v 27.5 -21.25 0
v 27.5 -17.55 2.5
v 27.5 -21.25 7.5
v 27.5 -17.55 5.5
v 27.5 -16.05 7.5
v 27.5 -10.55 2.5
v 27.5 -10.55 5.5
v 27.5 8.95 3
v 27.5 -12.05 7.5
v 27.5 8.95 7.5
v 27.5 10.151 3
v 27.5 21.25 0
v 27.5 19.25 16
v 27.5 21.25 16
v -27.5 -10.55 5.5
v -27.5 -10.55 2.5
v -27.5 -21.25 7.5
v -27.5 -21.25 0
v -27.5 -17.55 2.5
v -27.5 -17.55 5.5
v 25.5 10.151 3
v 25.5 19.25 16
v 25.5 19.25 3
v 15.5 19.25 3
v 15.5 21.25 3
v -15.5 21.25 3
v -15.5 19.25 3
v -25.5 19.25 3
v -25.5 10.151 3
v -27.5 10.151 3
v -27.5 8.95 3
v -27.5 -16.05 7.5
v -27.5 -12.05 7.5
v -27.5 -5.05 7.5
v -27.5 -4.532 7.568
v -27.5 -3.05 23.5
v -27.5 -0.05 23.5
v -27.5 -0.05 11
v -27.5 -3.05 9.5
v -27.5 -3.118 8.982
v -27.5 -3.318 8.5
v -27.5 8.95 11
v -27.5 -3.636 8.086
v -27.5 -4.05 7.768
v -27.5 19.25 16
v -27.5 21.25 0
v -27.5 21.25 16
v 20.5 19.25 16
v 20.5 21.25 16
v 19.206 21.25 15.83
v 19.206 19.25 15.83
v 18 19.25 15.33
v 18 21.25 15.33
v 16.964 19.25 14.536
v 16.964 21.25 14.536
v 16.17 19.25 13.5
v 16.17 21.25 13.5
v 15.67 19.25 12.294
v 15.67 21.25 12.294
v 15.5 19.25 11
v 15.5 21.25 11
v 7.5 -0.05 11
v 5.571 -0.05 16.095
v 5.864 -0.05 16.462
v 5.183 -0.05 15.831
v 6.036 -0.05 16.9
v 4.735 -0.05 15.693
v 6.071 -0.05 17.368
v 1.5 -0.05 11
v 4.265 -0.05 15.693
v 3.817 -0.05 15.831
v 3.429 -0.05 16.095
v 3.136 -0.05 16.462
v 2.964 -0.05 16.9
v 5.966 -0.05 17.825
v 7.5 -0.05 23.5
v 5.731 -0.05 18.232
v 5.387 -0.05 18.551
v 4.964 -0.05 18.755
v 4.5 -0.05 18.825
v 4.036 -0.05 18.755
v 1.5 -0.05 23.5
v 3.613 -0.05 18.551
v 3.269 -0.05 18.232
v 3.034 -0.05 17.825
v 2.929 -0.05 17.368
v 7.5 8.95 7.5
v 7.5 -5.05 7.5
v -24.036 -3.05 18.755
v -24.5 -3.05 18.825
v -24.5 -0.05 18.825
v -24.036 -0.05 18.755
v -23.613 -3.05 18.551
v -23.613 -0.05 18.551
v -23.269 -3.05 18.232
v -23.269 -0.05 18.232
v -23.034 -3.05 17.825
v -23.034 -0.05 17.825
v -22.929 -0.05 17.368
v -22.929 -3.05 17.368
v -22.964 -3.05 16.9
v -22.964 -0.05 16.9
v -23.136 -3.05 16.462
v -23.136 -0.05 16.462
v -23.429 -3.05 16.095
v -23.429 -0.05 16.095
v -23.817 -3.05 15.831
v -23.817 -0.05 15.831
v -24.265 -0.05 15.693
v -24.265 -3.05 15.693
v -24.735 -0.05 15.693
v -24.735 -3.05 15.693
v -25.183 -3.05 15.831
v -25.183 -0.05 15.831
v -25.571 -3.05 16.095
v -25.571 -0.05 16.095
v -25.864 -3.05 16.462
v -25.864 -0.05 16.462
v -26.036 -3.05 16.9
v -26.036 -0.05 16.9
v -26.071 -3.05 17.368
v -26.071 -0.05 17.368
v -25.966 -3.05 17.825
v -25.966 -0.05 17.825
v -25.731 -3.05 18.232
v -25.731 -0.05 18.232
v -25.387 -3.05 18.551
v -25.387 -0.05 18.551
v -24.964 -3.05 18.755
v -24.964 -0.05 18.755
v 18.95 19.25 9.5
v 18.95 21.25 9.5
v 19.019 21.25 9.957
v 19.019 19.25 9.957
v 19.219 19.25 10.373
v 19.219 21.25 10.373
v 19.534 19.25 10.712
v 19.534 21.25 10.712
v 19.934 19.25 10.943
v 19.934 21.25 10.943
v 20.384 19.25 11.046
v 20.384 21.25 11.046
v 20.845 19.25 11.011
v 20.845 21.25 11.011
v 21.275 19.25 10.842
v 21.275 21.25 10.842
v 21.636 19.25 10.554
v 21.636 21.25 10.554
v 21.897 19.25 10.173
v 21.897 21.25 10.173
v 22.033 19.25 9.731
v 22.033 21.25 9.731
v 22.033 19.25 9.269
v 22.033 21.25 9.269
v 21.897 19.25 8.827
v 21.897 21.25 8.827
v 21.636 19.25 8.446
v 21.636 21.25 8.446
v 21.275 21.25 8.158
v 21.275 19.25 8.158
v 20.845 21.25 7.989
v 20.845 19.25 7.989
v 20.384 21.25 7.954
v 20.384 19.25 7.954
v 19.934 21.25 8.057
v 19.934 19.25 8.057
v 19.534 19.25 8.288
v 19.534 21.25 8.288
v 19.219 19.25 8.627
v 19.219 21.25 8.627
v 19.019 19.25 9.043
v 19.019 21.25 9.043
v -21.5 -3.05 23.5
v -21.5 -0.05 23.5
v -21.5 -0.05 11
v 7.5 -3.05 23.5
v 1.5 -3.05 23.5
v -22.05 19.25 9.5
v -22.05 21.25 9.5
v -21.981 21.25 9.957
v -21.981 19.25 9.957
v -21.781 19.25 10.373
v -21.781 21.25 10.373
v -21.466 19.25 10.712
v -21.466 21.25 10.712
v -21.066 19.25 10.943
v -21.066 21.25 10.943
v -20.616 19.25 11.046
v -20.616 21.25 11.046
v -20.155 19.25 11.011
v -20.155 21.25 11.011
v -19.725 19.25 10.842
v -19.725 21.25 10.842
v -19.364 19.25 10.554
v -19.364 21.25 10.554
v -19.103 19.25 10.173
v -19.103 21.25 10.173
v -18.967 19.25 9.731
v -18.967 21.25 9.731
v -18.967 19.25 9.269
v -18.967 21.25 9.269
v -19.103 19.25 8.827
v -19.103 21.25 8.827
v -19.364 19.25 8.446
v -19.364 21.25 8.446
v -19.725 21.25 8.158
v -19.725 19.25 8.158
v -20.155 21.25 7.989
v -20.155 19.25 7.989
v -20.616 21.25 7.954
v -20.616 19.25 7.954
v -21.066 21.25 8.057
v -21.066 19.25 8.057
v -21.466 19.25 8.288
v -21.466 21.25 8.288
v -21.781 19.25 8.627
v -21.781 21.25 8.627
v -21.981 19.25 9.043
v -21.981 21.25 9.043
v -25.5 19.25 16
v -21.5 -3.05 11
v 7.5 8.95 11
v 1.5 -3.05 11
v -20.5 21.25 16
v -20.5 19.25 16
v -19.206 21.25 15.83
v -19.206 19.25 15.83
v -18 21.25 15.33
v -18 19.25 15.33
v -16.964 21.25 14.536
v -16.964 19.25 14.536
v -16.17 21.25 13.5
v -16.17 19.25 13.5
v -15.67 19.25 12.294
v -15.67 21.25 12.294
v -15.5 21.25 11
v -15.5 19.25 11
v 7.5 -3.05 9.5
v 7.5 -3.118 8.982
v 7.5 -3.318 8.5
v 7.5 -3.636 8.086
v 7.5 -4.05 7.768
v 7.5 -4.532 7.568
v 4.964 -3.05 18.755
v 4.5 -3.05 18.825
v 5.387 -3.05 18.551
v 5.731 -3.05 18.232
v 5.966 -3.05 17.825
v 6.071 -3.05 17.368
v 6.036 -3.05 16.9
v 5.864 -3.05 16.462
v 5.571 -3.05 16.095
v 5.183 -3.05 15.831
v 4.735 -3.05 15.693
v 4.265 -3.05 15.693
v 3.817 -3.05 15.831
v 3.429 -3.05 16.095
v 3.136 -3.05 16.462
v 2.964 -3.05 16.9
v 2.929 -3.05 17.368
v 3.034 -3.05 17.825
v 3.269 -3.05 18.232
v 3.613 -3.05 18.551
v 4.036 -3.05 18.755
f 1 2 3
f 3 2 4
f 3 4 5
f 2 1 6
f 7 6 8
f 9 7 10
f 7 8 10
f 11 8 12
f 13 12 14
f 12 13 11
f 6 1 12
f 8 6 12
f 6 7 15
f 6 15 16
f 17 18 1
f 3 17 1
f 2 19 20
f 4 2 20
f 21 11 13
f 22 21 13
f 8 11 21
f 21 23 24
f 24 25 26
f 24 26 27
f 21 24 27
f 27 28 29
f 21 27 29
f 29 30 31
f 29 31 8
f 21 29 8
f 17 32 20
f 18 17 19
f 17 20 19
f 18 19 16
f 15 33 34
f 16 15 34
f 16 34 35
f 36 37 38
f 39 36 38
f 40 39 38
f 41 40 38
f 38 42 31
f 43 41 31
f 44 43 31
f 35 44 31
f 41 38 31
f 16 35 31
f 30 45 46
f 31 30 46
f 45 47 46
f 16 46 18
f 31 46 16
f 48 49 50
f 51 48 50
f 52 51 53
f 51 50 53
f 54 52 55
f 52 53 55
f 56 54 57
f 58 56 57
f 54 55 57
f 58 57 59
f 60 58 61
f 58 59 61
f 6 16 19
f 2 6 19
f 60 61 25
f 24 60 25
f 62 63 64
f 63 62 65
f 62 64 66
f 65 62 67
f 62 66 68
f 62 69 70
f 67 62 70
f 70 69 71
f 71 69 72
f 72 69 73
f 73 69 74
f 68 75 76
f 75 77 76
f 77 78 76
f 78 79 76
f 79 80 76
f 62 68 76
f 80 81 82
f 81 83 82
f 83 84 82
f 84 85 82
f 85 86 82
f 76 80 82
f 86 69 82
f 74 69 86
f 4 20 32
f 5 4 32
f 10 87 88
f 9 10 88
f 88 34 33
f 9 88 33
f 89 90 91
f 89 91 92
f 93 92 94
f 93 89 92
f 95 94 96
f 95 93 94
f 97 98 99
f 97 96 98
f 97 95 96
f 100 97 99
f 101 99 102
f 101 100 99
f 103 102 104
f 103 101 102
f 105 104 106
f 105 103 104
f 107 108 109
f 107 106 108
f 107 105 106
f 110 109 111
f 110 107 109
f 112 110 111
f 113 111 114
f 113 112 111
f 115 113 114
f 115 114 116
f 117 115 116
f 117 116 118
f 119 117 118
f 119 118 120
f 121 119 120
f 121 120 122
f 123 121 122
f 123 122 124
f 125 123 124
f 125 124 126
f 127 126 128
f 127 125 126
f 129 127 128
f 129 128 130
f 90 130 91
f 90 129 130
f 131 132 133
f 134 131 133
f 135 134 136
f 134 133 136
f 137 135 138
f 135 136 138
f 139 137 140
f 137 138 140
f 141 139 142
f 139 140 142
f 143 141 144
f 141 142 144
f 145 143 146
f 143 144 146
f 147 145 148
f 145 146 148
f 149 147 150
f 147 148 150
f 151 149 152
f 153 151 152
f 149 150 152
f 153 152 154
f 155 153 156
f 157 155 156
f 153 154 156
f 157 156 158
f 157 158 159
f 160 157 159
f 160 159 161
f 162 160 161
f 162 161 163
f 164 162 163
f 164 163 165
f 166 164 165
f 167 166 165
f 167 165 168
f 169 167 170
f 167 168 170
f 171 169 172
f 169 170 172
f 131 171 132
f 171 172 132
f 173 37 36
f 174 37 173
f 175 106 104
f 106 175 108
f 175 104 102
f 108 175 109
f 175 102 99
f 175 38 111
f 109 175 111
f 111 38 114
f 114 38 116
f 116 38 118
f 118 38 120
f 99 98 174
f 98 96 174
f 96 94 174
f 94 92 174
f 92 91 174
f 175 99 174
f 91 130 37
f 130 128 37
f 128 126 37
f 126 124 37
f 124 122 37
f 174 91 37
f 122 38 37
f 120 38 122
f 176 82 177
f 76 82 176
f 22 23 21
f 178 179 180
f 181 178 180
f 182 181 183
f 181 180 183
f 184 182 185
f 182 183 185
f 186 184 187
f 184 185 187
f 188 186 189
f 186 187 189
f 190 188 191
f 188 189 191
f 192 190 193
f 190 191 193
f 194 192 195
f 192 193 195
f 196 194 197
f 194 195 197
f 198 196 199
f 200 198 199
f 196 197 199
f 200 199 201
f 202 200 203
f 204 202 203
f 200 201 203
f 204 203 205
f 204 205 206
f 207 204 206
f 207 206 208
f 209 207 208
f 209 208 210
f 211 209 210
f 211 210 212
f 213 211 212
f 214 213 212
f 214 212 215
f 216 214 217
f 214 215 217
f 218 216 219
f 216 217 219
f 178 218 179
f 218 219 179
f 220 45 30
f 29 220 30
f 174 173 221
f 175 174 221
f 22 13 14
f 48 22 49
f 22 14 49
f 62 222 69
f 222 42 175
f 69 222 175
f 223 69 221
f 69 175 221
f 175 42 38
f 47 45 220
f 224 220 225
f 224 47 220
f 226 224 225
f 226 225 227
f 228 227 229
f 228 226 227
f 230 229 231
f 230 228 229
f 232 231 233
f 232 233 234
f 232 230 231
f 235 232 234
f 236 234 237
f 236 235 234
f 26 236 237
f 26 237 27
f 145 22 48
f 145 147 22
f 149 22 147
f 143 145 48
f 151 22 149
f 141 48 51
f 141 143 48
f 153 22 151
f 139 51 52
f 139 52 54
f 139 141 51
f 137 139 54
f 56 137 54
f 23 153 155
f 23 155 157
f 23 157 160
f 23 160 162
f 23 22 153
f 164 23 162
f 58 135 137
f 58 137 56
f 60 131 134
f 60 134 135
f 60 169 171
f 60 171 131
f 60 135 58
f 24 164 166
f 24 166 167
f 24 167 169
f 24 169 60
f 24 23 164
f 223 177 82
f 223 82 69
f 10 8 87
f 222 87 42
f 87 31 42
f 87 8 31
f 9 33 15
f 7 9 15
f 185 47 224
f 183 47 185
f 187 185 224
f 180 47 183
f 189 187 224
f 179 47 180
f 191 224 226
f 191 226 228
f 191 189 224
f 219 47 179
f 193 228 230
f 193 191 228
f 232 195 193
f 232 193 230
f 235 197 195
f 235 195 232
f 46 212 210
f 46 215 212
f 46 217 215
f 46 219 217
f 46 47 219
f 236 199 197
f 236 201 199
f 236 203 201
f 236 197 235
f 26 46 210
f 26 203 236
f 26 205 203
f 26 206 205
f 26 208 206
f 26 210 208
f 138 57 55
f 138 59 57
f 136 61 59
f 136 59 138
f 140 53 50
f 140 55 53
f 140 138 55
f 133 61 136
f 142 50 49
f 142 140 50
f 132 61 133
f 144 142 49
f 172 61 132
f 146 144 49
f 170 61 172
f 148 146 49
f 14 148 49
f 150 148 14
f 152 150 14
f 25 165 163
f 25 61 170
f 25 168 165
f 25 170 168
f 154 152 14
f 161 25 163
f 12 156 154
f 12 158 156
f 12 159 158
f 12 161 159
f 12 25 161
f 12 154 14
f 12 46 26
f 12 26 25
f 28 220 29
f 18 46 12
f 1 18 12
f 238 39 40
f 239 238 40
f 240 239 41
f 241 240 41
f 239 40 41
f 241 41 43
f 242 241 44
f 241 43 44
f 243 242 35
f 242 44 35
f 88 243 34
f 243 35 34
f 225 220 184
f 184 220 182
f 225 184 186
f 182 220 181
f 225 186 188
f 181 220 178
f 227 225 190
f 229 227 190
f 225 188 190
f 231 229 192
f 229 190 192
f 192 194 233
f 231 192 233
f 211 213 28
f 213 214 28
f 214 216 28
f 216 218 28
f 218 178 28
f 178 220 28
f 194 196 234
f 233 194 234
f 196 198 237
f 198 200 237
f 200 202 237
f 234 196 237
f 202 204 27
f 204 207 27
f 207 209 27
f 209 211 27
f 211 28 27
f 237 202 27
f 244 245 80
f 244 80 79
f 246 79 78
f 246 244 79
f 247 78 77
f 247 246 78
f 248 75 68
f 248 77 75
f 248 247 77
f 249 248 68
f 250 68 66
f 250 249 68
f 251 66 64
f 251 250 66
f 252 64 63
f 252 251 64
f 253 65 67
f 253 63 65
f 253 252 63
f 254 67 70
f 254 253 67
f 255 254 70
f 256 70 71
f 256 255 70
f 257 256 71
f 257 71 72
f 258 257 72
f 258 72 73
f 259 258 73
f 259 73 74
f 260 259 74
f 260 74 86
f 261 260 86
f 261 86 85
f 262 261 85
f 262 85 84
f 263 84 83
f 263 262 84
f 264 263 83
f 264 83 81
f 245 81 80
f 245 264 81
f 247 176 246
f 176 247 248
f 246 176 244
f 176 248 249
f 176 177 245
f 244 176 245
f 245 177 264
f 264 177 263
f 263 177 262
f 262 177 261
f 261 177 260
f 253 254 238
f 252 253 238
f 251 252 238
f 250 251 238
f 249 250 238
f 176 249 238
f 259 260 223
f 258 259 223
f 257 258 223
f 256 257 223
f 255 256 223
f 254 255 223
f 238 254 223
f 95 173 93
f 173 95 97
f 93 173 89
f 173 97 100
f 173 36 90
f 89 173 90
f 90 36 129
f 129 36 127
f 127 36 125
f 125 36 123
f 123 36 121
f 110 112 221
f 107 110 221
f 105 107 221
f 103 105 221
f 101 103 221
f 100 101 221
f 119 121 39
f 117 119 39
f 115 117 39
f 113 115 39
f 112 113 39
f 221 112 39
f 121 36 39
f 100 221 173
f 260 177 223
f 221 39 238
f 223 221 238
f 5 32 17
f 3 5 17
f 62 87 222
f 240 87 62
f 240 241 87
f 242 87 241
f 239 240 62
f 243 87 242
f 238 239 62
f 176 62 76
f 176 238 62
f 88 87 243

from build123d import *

# Parameters (mm, degrees)
SKETCH1_W               = 55
SKETCH1_H               = 42.5
BOSS_EXTRUDE1_DEPTH     = 23.5
CUT_EXTRUDE1_DEPTH      = 64.4729273
CUT_EXTRUDE1_DEPTH_BACK = 64.4729273
CUT_EXTRUDE2_DEPTH      = 42.953098813
CUT_EXTRUDE2_DEPTH_BACK = 42.953098813
CUT_EXTRUDE3_DEPTH      = 42.953098813
CUT_EXTRUDE3_DEPTH_BACK = 42.953098813
SKETCH4_W               = 23
SKETCH4_H               = 12.5
CUT_EXTRUDE4_DEPTH      = 42.978446851
CUT_EXTRUDE4_DEPTH_BACK = 42.978446851
SKETCH5_R               = 1.575
BOSS_EXTRUDE2_DEPTH     = 2
BOSS_EXTRUDE3_DEPTH     = 2
BOSS_EXTRUDE4_DEPTH     = 2
SKETCH11_R              = 1.55
CUT_EXTRUDE5_DEPTH      = 2


with BuildPart() as part:
    # Sketch1 → Boss-Extrude1 (new body)
    with BuildSketch(Plane.XY):
        Rectangle(SKETCH1_W, SKETCH1_H)
    extrude(amount=BOSS_EXTRUDE1_DEPTH)

    # Sketch2 → Cut-Extrude1 (cut, two sides: drawn at the far end of the back side and taken through both)
    with BuildSketch(Plane(origin=(27.5, 0, 0), x_dir=(0, 0, -1), z_dir=(1, 0, 0)).offset(-CUT_EXTRUDE1_DEPTH_BACK)):
        with BuildLine():
            Line((-3, 21.25), (-3, 8.95))
            Line((-3, 8.95), (-11, 8.95))
            Line((-11, 8.95), (-11, -0.05))
            Line((-11, -0.05), (-23.5, -0.05))
            Line((-23.5, -0.05), (-23.5, -3.05))
            Line((-23.5, -3.05), (-9.5, -3.05))
            ThreePointArc((-9.5, -3.05), (-8.085786438, -3.635786438), (-7.5, -5.05))
            Line((-7.5, -5.05), (-7.5, -12.05))
            Line((-7.5, -12.05), (-5.5, -10.55))
            Line((-5.5, -10.55), (-2.5, -10.55))
            Line((-2.5, -10.55), (-2.5, -17.55))
            Line((-2.5, -17.55), (-5.5, -17.55))
            Line((-5.5, -17.55), (-7.5, -16.05))
            Line((-7.5, -16.05), (-7.5, -21.25))
            Line((-7.5, -21.25), (-33.241676539, -21.25))
            Line((-33.241676539, -21.25), (-33.241676539, 21.25))
            Line((-33.241676539, 21.25), (-3, 21.25))
        make_face()
    extrude(amount=CUT_EXTRUDE1_DEPTH + CUT_EXTRUDE1_DEPTH_BACK, mode=Mode.SUBTRACT)

    # Sketch3 → Cut-Extrude2 (cut, two sides: drawn at the far end of the back side and taken through both)
    with BuildSketch(Plane(origin=(0, 0, 0), x_dir=(1, 0, 0), z_dir=(0, 1, 0)).offset(-CUT_EXTRUDE2_DEPTH_BACK)):
        Polygon((7.5, -10.995887084), (7.5, -23.5), (27.5, -23.5), (27.5, -10.993542952), (27.5, -7.5), (7.5, -7.5), align=None)
    extrude(amount=CUT_EXTRUDE2_DEPTH + CUT_EXTRUDE2_DEPTH_BACK, mode=Mode.SUBTRACT)

    # Sketch4 → Cut-Extrude3 (cut, two sides: drawn at the far end of the back side and taken through both)
    with BuildSketch(Plane(origin=(0, 0, 0), x_dir=(1, 0, 0), z_dir=(0, 1, 0)).offset(-CUT_EXTRUDE3_DEPTH_BACK)):
        with Locations((-10, -17.25)):
            Rectangle(SKETCH4_W, SKETCH4_H)
    extrude(amount=CUT_EXTRUDE3_DEPTH + CUT_EXTRUDE3_DEPTH_BACK, mode=Mode.SUBTRACT)

    # Sketch5 → Cut-Extrude4 (cut, two sides: drawn at the far end of the back side and taken through both)
    with BuildSketch(Plane(origin=(0, -0.05, 0), x_dir=(1, 0, 0), z_dir=(0, 1, 0)).offset(-CUT_EXTRUDE4_DEPTH_BACK)):
        with Locations(Location((-24.5, -17.25, 0), (0, 0, 270))):
            Circle(SKETCH5_R)
        with Locations(Location((4.5, -17.25, 0), (0, 0, 270))):
            Circle(SKETCH5_R)
    extrude(amount=CUT_EXTRUDE4_DEPTH + CUT_EXTRUDE4_DEPTH_BACK, mode=Mode.SUBTRACT)

    # Sketch6 → Boss-Extrude2 (add)
    with BuildSketch(Plane(origin=(0, 21.25, 0), x_dir=(1, 0, 0), z_dir=(0, 1, 0))):
        with BuildLine():
            Line((-27.5, -3), (-27.5, -16))
            Line((-27.5, -16), (-20.5, -16))
            ThreePointArc((-20.5, -16), (-16.964466094, -14.535533906), (-15.5, -11))
            Line((-15.5, -11), (-15.5, -3))
            Line((-15.5, -3), (-27.5, -3))
        make_face()
        with BuildLine():
            Line((15.5, -3), (27.5, -3))
            Line((27.5, -3), (27.5, -16))
            Line((27.5, -16), (20.5, -16))
            ThreePointArc((20.5, -16), (16.964466094, -14.535533906), (15.5, -11))
            Line((15.5, -11), (15.5, -3))
        make_face()
    extrude(amount=-BOSS_EXTRUDE2_DEPTH)

    # Sketch7 → Boss-Extrude3 (add)
    with BuildSketch(Plane(origin=(27.5, 0, 0), x_dir=(0, 0, -1), z_dir=(1, 0, 0))):
        Polygon((-3, 19.25), (-3, 10.150500969), (-16, 19.25), align=None)
    extrude(amount=-BOSS_EXTRUDE3_DEPTH)

    # Sketch9 → Boss-Extrude4 (add)
    with BuildSketch(Plane.ZY.offset(27.5)):
        Polygon((16, 19.25), (3, 10.150500969), (3, 19.25), align=None)
    extrude(amount=-BOSS_EXTRUDE4_DEPTH)

    # Sketch11 → Cut-Extrude5 (cut)
    with BuildSketch(Plane(origin=(0, 21.25, 0), x_dir=(1, 0, 0), z_dir=(0, 1, 0))):
        with Locations(Location((-20.5, -9.5, 0), (0, 0, 180))):
            Circle(SKETCH11_R)
        with Locations(Location((20.5, -9.5, 0), (0, 0, 180))):
            Circle(SKETCH11_R)
    extrude(amount=-CUT_EXTRUDE5_DEPTH, mode=Mode.SUBTRACT)


solid = part.part
